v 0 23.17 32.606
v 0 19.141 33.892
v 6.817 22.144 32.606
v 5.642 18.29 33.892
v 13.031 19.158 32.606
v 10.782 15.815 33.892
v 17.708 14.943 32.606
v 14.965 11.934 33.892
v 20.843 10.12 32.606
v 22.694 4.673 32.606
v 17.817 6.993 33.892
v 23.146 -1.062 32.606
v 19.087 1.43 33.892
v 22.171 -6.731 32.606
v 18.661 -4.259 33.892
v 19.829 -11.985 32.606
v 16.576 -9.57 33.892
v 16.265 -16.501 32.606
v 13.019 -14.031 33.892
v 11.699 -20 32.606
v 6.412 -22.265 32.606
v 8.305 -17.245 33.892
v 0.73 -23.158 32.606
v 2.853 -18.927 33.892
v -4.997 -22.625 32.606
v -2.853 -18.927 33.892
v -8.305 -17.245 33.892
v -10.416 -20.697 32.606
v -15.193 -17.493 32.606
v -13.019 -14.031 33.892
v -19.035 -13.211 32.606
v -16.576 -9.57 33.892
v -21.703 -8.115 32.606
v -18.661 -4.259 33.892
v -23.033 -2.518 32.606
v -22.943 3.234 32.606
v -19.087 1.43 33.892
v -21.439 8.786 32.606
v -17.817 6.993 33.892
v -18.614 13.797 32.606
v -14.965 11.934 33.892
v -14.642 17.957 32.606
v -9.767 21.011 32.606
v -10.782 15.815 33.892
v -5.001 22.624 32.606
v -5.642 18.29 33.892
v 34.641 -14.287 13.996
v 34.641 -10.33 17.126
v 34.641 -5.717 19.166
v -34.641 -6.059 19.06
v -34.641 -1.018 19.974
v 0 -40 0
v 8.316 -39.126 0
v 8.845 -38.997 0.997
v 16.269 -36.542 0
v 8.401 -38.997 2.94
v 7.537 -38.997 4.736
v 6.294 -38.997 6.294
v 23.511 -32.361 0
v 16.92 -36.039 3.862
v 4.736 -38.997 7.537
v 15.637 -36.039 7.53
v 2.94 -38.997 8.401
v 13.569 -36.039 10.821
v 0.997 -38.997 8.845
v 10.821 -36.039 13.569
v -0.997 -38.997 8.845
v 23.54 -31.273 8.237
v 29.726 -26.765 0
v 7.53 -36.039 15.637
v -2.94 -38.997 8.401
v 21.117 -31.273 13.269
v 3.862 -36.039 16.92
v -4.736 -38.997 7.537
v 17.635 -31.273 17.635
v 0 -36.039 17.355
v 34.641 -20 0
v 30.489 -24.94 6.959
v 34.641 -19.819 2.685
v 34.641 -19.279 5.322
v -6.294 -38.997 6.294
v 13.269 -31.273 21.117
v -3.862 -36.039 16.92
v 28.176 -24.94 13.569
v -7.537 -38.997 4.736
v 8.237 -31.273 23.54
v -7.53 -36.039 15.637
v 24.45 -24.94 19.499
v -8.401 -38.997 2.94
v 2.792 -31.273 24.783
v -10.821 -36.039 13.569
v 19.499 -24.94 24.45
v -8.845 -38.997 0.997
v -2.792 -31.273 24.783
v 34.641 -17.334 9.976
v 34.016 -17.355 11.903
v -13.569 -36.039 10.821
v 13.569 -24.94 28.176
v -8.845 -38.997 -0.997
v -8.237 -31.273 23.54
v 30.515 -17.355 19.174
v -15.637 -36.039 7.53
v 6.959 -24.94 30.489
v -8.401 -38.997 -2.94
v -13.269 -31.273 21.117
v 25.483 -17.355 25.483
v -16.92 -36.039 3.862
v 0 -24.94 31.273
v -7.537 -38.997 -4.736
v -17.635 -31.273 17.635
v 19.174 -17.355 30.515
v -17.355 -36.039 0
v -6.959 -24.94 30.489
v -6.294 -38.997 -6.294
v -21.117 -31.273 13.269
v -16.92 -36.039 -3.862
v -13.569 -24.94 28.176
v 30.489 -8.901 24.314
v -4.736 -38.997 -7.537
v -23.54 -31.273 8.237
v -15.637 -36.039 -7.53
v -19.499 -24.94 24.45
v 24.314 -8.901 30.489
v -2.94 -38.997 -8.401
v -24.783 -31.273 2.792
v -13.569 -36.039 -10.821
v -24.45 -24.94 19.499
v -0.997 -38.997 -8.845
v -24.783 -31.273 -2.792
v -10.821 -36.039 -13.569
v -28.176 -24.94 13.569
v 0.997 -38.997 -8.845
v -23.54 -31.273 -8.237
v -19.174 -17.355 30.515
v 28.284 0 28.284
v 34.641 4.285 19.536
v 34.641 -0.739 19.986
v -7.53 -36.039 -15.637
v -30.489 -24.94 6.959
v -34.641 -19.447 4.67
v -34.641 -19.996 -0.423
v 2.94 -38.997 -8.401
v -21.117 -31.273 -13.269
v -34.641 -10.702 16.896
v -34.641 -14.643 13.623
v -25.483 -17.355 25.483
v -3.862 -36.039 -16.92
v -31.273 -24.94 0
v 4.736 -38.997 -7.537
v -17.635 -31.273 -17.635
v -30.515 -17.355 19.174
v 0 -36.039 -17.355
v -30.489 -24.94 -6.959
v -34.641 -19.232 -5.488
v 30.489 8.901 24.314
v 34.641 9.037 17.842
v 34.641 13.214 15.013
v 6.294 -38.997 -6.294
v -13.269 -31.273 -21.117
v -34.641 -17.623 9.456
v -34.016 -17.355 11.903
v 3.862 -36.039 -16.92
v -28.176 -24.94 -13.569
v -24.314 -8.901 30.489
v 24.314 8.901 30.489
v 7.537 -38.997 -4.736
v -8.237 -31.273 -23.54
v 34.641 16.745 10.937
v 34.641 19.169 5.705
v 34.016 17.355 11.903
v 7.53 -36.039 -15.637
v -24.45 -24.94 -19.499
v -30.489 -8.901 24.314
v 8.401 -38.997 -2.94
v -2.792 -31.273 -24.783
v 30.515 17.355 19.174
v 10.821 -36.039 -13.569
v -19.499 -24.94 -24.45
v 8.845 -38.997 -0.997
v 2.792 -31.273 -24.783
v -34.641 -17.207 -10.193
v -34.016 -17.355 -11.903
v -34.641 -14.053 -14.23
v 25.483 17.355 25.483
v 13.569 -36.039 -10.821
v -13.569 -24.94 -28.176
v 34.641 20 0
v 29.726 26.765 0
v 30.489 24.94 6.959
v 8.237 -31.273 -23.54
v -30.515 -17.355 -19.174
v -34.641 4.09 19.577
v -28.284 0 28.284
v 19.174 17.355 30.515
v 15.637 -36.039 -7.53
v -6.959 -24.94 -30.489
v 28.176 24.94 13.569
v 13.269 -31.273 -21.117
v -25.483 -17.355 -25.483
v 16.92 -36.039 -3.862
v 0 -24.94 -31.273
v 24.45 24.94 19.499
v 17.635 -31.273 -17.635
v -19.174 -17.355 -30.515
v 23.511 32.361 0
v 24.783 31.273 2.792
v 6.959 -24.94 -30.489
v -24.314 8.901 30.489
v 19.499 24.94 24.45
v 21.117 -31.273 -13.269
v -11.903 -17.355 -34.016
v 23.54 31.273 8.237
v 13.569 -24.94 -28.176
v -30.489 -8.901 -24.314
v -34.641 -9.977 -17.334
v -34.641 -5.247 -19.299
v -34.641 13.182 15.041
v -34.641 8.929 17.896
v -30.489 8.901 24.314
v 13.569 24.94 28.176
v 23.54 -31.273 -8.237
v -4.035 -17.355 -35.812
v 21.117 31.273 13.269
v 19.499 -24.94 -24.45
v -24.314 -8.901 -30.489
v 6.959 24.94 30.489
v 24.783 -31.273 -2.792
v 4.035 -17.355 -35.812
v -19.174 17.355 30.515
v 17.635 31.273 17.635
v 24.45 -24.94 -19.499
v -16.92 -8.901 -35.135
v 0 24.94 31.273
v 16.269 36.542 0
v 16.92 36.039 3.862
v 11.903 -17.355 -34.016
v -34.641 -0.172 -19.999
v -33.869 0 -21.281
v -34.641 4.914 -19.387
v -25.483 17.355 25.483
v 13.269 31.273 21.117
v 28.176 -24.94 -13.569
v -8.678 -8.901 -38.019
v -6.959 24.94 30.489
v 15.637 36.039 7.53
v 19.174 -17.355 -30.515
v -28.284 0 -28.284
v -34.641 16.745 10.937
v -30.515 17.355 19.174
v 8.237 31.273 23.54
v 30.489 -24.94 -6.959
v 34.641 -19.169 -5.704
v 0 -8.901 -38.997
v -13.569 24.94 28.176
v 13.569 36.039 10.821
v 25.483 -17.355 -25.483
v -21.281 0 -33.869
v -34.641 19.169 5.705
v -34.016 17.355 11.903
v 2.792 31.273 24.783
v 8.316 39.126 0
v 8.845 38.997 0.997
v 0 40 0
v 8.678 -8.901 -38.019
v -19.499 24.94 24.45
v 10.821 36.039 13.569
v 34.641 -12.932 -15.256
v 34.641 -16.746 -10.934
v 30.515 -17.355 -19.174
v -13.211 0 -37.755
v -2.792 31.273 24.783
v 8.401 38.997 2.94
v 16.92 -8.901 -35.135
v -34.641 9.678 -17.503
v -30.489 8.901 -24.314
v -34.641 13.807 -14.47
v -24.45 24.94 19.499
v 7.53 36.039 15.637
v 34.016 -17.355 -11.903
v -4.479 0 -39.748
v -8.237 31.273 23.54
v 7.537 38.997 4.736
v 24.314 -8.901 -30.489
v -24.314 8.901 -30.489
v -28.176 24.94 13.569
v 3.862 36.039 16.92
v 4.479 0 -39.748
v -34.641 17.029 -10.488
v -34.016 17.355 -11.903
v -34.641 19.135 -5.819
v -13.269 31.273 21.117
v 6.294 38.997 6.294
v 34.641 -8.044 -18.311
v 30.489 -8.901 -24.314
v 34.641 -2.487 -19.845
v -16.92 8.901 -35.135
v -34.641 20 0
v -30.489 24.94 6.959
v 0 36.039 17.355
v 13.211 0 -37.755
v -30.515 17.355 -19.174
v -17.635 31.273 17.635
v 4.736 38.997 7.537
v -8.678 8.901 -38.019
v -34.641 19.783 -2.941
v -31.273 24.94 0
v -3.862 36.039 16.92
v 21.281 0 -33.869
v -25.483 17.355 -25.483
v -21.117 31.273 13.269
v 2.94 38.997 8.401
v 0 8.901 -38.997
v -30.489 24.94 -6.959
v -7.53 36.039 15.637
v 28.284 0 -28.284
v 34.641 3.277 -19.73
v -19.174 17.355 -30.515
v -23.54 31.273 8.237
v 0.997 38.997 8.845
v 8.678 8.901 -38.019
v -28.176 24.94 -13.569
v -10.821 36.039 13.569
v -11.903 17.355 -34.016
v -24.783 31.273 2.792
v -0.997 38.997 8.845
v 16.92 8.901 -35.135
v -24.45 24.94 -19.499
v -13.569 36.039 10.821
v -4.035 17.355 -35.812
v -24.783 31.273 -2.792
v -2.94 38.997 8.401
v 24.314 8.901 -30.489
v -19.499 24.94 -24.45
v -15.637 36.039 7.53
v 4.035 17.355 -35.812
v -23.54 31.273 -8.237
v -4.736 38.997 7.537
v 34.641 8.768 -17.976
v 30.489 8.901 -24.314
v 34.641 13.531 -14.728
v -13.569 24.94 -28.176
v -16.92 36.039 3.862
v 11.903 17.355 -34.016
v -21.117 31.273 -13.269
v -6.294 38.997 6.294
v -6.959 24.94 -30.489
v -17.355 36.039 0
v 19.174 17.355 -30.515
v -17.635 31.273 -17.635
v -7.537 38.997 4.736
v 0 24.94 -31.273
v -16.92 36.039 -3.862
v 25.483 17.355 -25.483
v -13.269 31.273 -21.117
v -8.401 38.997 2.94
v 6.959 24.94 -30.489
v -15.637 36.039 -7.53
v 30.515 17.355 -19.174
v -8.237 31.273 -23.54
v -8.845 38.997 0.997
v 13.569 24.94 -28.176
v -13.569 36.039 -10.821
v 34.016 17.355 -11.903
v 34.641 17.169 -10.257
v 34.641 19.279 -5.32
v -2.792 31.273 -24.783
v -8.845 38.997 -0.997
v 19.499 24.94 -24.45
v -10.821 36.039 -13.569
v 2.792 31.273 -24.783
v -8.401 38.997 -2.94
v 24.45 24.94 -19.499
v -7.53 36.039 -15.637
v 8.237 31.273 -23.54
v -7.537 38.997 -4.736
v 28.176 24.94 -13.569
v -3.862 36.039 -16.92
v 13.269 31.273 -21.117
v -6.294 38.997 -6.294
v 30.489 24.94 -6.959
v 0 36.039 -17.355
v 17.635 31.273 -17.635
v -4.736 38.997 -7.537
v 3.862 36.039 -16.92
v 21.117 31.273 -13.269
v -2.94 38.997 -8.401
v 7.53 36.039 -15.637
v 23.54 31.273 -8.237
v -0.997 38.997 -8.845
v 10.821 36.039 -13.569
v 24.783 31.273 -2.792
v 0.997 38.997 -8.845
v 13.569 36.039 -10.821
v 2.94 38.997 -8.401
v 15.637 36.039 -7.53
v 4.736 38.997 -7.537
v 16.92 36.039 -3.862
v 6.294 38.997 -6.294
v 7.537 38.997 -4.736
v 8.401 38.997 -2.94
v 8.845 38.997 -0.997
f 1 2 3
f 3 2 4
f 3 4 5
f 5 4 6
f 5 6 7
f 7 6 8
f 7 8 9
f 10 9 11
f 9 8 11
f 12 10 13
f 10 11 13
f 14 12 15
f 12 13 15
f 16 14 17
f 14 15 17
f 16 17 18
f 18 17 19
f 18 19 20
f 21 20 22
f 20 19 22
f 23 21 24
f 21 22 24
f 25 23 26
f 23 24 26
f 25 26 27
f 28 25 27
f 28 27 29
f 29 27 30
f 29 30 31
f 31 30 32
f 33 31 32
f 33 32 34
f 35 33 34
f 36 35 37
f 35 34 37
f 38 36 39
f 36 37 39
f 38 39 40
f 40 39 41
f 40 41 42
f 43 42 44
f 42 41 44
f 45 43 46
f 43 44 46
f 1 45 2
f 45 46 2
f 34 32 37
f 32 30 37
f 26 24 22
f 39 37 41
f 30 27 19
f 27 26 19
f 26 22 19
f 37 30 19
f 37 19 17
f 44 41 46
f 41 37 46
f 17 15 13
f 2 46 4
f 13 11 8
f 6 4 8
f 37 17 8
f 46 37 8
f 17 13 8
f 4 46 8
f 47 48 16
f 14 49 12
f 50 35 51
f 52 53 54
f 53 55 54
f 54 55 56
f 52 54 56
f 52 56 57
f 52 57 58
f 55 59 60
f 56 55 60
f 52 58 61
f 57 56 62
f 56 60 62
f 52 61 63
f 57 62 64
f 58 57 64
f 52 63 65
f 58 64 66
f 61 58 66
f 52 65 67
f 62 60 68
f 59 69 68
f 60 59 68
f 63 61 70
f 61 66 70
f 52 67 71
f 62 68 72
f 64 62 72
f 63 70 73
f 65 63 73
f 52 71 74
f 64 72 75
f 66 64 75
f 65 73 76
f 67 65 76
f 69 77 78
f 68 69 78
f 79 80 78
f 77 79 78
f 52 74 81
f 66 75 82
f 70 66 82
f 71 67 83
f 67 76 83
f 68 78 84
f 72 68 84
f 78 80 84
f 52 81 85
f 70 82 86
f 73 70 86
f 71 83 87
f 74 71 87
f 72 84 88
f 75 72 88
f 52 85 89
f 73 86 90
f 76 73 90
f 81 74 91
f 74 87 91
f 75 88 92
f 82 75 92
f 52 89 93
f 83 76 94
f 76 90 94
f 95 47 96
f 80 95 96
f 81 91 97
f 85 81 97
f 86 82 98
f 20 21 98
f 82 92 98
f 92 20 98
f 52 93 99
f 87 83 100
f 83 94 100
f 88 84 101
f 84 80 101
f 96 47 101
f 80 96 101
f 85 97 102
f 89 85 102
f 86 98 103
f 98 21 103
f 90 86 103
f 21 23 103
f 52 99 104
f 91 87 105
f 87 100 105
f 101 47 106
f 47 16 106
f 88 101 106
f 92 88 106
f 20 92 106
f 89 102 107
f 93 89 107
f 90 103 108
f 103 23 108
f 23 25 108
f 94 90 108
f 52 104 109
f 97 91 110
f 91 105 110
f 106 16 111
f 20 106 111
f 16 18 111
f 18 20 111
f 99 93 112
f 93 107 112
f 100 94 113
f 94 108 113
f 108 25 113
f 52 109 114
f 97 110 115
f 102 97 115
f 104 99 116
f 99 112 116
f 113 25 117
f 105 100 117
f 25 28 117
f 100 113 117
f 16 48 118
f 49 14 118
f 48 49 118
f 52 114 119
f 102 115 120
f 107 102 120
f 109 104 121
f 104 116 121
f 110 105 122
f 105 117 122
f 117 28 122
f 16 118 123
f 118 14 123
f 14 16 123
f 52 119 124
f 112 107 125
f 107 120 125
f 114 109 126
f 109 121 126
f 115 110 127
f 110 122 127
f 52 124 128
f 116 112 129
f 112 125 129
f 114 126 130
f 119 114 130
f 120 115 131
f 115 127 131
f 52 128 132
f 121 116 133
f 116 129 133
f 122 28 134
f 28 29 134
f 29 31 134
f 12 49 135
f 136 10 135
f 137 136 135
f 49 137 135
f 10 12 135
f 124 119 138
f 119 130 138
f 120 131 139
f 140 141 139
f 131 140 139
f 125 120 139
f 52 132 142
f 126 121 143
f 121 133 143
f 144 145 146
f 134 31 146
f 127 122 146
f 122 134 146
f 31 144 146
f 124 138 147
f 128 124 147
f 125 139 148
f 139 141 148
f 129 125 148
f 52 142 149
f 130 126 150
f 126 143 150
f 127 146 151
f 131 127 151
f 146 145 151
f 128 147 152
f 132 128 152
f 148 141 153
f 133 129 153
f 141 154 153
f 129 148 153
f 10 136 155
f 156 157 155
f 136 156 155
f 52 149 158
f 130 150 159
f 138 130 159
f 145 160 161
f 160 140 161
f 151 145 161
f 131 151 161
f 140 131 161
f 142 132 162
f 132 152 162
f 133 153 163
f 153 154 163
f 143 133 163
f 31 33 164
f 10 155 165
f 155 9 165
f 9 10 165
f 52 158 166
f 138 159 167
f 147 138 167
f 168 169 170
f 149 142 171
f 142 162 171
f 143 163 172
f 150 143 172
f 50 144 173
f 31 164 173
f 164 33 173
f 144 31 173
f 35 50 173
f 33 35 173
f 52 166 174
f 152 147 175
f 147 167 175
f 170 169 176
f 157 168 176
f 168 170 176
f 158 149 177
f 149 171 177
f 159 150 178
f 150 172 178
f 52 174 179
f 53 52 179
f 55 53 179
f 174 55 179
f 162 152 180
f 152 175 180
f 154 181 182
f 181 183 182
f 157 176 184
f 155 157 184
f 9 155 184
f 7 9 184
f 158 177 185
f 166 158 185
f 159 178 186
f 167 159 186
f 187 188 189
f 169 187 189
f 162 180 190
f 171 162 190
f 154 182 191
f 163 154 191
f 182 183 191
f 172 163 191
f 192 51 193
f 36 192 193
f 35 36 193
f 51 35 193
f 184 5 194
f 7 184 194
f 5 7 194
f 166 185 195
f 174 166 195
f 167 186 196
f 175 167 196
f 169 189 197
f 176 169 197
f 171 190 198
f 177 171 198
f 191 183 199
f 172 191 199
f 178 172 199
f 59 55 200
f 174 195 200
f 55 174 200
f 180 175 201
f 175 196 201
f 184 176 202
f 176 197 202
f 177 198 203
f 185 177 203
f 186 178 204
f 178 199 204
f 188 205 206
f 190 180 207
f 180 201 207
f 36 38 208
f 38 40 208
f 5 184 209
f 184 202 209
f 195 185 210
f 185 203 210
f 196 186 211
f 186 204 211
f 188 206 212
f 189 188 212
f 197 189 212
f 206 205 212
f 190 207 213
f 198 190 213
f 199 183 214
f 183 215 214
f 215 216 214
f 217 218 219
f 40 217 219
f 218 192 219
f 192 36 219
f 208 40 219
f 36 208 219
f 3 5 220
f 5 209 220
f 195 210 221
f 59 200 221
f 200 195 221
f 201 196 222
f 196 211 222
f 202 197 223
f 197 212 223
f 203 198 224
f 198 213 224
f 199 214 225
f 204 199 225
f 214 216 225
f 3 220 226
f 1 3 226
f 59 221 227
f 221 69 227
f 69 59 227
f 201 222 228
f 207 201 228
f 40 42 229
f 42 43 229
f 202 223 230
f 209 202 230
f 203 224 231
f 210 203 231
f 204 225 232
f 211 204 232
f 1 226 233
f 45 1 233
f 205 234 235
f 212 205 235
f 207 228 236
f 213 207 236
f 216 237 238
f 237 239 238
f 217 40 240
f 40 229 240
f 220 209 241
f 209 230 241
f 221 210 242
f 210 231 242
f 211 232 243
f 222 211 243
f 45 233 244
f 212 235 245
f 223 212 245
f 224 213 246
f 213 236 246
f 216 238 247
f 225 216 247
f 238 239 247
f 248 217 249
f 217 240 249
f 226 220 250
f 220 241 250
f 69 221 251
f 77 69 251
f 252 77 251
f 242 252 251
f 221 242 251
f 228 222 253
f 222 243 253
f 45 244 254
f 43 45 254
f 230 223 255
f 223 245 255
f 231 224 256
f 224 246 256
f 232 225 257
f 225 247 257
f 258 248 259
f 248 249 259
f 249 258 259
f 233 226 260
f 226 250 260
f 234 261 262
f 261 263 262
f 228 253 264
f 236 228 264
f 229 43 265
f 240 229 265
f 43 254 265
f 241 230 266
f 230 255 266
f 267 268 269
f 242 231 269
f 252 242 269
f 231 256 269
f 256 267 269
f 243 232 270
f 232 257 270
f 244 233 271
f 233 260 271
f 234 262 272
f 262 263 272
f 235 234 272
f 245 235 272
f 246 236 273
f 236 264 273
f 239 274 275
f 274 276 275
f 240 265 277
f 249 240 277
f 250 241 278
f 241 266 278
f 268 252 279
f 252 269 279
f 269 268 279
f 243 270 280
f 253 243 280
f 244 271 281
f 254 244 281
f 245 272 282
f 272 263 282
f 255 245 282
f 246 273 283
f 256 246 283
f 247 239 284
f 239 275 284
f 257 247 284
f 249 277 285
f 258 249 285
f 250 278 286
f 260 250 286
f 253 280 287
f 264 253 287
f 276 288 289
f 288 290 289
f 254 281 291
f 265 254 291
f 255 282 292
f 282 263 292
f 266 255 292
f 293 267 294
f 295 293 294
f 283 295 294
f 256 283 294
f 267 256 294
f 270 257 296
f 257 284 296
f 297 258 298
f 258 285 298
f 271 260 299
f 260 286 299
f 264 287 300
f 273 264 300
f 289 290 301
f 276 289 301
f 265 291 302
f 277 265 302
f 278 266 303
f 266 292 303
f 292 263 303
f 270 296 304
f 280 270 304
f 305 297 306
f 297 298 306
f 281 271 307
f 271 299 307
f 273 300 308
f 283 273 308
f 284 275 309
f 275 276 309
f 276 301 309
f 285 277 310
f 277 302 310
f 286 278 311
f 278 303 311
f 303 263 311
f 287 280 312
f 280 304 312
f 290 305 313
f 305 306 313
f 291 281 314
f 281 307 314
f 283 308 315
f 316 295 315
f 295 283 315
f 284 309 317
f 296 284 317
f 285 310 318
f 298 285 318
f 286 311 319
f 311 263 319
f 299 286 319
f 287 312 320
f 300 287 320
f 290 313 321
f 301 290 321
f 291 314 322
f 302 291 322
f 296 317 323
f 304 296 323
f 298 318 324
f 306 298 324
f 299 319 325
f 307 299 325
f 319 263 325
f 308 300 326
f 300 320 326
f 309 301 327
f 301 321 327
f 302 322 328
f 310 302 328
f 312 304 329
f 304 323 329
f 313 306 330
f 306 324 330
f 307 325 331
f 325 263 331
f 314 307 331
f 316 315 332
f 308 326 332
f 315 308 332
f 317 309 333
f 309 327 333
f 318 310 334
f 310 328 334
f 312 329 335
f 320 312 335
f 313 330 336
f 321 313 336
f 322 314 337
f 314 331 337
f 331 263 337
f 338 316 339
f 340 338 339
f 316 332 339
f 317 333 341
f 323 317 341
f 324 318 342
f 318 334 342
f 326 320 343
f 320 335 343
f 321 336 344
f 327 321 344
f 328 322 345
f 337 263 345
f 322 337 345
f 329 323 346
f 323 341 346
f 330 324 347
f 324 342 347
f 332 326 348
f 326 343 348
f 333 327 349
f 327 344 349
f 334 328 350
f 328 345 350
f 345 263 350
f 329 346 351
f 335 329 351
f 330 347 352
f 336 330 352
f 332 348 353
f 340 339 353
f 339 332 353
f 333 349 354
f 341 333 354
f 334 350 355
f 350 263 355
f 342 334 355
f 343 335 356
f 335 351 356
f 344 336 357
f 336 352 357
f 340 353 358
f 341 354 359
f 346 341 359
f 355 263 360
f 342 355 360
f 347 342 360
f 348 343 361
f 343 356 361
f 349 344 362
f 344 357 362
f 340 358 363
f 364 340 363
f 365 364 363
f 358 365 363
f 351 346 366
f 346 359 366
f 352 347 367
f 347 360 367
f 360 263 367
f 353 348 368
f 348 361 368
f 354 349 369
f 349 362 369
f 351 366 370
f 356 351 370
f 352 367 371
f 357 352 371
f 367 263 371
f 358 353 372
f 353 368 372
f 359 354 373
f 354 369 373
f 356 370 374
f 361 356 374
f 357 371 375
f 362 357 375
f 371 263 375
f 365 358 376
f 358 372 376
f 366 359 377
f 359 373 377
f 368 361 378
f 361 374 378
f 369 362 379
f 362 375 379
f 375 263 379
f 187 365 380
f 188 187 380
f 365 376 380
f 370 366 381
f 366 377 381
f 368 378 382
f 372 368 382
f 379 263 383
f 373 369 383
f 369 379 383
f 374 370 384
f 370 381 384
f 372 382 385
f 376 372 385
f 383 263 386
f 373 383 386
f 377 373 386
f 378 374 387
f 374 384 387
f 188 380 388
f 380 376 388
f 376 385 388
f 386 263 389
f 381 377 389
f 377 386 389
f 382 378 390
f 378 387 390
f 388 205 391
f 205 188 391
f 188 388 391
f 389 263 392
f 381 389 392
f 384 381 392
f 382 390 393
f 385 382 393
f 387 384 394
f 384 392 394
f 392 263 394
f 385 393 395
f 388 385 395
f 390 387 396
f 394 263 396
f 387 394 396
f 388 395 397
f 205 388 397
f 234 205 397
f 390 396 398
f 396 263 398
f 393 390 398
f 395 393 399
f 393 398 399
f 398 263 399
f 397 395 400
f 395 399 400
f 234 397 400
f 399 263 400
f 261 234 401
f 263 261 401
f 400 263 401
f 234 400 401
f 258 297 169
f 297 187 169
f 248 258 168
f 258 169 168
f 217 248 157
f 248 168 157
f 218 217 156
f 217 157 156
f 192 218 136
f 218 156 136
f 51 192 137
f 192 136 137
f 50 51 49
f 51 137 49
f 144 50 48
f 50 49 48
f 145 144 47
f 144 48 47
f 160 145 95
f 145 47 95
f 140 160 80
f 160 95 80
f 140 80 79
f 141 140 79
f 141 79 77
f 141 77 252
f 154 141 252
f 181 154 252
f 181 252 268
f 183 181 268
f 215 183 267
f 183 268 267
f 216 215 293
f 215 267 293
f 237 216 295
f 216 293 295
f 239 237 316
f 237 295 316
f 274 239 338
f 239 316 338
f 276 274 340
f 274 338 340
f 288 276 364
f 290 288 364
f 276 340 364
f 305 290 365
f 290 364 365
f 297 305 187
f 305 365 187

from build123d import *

# Parameters (mm, degrees)
F2_R     = 20
F3_DEPTH = 50
F4_W     = 62.4089296907
F4_H     = 39.0701051801
F5_DEPTH = 50


# Not quite as in the source:
# - a fillet or chamfer that OpenCascade refuses, or shapes differently, is made with other operations: its cross-section is extruded or revolved along the edge and cut away or added


with BuildPart() as f1:
    # F0 (on Top) → F1 (revolve)
    with BuildSketch(Plane.XY):
        with BuildLine():
            Line((0, 40), (0, -40))
            ThreePointArc((0, -40), (40, 0), (0, 40))
        make_face()
    revolve(axis=Axis((0, 0, 0), (0, -1, 0)))

    # F2 (on Right) → F3 (cut, symmetric)
    with BuildSketch(Plane.YZ):
        Circle(F2_R)
    extrude(amount=F3_DEPTH, both=True, mode=Mode.SUBTRACT)

    # F4 (on Right) → F5 (cut, symmetric)
    with BuildSketch(Plane.YZ):
        with Locations((0.7427642122, 53.4269148484)):
            Rectangle(F4_W, F4_H)
    extrude(amount=F5_DEPTH, both=True, mode=Mode.SUBTRACT)

    # F6: chamfer of 2 on 1 edges, made by hand

    # F6_s1 → F6_t2 (revolve, cut)
    with BuildSketch(Plane.YZ):
        with BuildLine():
            Line((23.2462048843, 32.5816827787), (19.0643837553, 33.916183436))
            Line((19.0643837553, 33.916183436), (19.0643837553, 33.956183436))
            ThreePointArc((19.0643837553, 33.956183436), (20.1545935913, 33.9318622583), (21.2448034273, 33.9318622583))
            Line((21.2448034273, 33.9318622583), (21.2660482307, 33.9257541206))
            ThreePointArc((21.2660482307, 33.9257541206), (22.2709130322, 33.2747356521), (23.2693748758, 32.6142887827))
            Line((23.2693748758, 32.6142887827), (23.2462048843, 32.5816827787))
        make_face()
    revolve(axis=Axis((0, 0, 33.8918622583), (0, 0, -1)), mode=Mode.SUBTRACT)


solid = f1.part
